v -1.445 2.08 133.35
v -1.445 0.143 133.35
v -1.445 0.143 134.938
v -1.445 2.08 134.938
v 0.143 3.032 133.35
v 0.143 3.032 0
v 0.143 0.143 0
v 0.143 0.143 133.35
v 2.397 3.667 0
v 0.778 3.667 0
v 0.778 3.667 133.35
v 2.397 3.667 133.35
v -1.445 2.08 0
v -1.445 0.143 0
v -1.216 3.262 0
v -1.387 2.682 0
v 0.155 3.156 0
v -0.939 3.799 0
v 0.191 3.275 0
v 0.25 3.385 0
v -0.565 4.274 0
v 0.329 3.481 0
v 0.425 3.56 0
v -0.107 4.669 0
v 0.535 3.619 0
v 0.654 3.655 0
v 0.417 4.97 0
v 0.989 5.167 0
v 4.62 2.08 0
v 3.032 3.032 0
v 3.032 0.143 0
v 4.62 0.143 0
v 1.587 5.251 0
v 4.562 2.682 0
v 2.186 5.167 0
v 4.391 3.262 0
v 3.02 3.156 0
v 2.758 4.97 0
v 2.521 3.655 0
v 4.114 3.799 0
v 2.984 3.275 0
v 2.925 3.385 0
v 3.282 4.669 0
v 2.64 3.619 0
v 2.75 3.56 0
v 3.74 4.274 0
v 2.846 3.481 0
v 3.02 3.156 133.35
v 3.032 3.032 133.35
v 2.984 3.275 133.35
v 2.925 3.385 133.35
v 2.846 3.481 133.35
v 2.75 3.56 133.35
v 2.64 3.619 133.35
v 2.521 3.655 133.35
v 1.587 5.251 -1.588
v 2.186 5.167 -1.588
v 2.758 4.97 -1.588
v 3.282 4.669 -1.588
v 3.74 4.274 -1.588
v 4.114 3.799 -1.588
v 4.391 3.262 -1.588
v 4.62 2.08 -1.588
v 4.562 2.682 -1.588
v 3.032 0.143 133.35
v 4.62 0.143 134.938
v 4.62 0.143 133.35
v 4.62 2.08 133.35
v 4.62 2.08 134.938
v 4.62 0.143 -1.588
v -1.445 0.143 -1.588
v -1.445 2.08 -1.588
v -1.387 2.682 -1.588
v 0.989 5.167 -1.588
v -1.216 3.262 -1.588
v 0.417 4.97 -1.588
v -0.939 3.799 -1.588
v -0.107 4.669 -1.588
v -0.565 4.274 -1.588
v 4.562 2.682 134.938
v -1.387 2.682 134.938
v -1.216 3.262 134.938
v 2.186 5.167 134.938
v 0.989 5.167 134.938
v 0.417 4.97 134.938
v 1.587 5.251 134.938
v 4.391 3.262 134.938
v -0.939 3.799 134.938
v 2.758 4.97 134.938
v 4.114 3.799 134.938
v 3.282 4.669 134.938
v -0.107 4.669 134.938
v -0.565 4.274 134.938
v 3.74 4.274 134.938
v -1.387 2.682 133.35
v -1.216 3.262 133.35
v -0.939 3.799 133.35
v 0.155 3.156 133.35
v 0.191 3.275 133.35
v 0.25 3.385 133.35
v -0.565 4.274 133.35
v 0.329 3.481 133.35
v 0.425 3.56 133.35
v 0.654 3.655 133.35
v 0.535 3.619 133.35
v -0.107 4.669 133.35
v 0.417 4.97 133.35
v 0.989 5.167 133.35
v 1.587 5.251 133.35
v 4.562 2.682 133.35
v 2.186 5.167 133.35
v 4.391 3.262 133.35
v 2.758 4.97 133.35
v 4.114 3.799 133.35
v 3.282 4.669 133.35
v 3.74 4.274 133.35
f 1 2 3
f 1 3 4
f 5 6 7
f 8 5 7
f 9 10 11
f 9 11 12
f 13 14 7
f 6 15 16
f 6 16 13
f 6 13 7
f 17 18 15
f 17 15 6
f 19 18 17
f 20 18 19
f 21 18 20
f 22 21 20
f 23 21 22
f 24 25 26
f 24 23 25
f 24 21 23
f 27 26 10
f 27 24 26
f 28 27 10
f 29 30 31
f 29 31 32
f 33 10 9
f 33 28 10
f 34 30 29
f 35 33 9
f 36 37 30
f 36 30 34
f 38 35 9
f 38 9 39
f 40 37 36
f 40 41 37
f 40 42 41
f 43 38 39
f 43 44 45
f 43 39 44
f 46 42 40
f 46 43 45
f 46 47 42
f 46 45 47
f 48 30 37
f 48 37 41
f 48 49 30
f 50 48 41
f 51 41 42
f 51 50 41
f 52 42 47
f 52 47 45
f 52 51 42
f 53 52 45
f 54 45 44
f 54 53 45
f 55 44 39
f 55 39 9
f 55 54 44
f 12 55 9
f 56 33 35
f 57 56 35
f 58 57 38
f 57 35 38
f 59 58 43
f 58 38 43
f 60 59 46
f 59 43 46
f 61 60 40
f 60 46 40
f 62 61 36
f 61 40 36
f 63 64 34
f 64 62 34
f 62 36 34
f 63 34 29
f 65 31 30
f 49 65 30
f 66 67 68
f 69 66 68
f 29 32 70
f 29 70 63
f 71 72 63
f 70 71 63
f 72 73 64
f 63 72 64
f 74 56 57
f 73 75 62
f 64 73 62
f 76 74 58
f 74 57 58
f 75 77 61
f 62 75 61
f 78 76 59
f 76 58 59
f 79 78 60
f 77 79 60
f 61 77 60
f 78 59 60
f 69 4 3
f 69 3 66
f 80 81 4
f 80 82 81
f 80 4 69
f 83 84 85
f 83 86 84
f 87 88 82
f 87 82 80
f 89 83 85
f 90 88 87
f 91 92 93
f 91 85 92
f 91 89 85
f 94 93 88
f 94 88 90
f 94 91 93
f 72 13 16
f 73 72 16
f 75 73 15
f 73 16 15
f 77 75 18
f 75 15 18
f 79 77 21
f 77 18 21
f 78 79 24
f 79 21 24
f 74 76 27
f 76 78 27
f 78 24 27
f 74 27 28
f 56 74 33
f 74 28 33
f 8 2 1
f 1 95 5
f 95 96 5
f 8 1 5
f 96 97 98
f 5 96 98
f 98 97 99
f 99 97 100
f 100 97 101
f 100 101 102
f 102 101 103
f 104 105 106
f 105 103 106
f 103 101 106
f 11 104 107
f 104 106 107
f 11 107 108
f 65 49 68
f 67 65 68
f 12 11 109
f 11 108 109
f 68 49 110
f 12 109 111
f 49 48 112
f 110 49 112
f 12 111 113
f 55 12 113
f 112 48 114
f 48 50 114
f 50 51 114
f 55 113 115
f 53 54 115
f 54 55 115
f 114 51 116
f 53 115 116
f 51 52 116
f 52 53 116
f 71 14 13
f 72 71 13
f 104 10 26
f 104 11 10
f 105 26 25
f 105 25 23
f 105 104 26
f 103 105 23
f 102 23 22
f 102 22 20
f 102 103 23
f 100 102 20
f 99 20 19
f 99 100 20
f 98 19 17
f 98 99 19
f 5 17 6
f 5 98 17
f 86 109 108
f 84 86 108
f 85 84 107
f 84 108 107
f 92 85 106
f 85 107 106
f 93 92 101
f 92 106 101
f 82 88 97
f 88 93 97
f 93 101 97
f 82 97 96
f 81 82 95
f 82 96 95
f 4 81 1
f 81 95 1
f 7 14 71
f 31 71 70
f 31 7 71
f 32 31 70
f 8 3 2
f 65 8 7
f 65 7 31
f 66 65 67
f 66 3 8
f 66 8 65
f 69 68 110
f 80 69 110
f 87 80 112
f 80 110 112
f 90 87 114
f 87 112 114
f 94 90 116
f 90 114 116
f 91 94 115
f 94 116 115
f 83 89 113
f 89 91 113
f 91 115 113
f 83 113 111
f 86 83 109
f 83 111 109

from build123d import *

# Parameters (mm, degrees)
BOSS_EXTRUDE1_DEPTH  = 133.35
SKETCH2_W            = 6.06425
SKETCH2_H            = 5.11175
BOSS_EXTRUDE2_DEPTH  = 1.5875
FILLET1_R            = 3.175
FILLET1_OF_MIRROR1_R = 3.175
FILLET2_R            = 0.635


with BuildPart() as part:
    # Sketch1 → Boss-Extrude1 (new body)
    with BuildSketch(Plane.XY):
        Polygon((0.142875, 3.667125), (3.032125, 3.667125), (3.032125, 1.905), (3.032125, 0.142875), (0.142875, 0.142875), (0.142875, 1.905), align=None)
    extrude(amount=BOSS_EXTRUDE1_DEPTH)

    # Sketch2 → Boss-Extrude2 (add)
    with BuildSketch(Plane.XY.offset(133.35)):
        with Locations((1.5875, 2.69875)):
            Rectangle(SKETCH2_W, SKETCH2_H)
    boss_extrude2 = extrude(amount=BOSS_EXTRUDE2_DEPTH)

    # Fillet1
    # the kernel refuses this fillet: 3.175 mm, written as the material it takes off along each edge
    with BuildSketch(Plane(origin=(-1.444625, 5.254625, 125.4125), x_dir=(0, -1, 0), z_dir=(0, 0, 1))) as fillet1_piece_1:
        with BuildLine():
            CenterArc((FILLET1_R, FILLET1_R), FILLET1_R, 180, 90)
            Line((0, FILLET1_R), (0, 0))
            Line((0, 0), (FILLET1_R, 0))
        make_face()
    extrude(amount=17.4625, mode=Mode.SUBTRACT)
    with BuildSketch(Plane(origin=(4.619625, 5.254625, 125.4125), x_dir=(0, -1, 0), z_dir=(0, 0, 1))) as fillet1_piece_2:
        with BuildLine():
            CenterArc((FILLET1_R, -FILLET1_R), FILLET1_R, 90, 90)
            Line((0, -FILLET1_R), (0, 0))
            Line((0, 0), (FILLET1_R, 0))
        make_face()
    extrude(amount=17.4625, mode=Mode.SUBTRACT)

    # Mirror1: Boss-Extrude2 across plane
    add(boss_extrude2.mirror(Plane.XY.offset(66.675)))

    # Fillet1 of Mirror1
    # the kernel refuses this fillet: 3.175 mm, written as the material it takes off along each edge
    with BuildSketch(Plane(origin=(-1.444625, 5.254625, 7.9375), x_dir=(0, -1, 0), z_dir=(0, 0, -1))) as fillet1_of_mirror1_piece_1:
        with BuildLine():
            CenterArc((FILLET1_OF_MIRROR1_R, -FILLET1_OF_MIRROR1_R), FILLET1_OF_MIRROR1_R, 90, 90)
            Line((0, -FILLET1_OF_MIRROR1_R), (0, 0))
            Line((0, 0), (FILLET1_OF_MIRROR1_R, 0))
        make_face()
    extrude(amount=17.4625, mode=Mode.SUBTRACT)
    with BuildSketch(Plane(origin=(4.619625, 5.254625, 7.9375), x_dir=(0, -1, 0), z_dir=(0, 0, -1))) as fillet1_of_mirror1_piece_2:
        with BuildLine():
            CenterArc((FILLET1_OF_MIRROR1_R, FILLET1_OF_MIRROR1_R), FILLET1_OF_MIRROR1_R, 180, 90)
            Line((0, FILLET1_OF_MIRROR1_R), (0, 0))
            Line((0, 0), (FILLET1_OF_MIRROR1_R, 0))
        make_face()
    extrude(amount=17.4625, mode=Mode.SUBTRACT)

    # Fillet2
    fillet2_edges = [part.edges().sort_by_distance(p)[0] for p in [
        (3.032125, 3.667125, 66.675),
        (0.142875, 3.667125, 66.675),
    ]]
    fillet(fillet2_edges, radius=FILLET2_R)


solid = part.part
